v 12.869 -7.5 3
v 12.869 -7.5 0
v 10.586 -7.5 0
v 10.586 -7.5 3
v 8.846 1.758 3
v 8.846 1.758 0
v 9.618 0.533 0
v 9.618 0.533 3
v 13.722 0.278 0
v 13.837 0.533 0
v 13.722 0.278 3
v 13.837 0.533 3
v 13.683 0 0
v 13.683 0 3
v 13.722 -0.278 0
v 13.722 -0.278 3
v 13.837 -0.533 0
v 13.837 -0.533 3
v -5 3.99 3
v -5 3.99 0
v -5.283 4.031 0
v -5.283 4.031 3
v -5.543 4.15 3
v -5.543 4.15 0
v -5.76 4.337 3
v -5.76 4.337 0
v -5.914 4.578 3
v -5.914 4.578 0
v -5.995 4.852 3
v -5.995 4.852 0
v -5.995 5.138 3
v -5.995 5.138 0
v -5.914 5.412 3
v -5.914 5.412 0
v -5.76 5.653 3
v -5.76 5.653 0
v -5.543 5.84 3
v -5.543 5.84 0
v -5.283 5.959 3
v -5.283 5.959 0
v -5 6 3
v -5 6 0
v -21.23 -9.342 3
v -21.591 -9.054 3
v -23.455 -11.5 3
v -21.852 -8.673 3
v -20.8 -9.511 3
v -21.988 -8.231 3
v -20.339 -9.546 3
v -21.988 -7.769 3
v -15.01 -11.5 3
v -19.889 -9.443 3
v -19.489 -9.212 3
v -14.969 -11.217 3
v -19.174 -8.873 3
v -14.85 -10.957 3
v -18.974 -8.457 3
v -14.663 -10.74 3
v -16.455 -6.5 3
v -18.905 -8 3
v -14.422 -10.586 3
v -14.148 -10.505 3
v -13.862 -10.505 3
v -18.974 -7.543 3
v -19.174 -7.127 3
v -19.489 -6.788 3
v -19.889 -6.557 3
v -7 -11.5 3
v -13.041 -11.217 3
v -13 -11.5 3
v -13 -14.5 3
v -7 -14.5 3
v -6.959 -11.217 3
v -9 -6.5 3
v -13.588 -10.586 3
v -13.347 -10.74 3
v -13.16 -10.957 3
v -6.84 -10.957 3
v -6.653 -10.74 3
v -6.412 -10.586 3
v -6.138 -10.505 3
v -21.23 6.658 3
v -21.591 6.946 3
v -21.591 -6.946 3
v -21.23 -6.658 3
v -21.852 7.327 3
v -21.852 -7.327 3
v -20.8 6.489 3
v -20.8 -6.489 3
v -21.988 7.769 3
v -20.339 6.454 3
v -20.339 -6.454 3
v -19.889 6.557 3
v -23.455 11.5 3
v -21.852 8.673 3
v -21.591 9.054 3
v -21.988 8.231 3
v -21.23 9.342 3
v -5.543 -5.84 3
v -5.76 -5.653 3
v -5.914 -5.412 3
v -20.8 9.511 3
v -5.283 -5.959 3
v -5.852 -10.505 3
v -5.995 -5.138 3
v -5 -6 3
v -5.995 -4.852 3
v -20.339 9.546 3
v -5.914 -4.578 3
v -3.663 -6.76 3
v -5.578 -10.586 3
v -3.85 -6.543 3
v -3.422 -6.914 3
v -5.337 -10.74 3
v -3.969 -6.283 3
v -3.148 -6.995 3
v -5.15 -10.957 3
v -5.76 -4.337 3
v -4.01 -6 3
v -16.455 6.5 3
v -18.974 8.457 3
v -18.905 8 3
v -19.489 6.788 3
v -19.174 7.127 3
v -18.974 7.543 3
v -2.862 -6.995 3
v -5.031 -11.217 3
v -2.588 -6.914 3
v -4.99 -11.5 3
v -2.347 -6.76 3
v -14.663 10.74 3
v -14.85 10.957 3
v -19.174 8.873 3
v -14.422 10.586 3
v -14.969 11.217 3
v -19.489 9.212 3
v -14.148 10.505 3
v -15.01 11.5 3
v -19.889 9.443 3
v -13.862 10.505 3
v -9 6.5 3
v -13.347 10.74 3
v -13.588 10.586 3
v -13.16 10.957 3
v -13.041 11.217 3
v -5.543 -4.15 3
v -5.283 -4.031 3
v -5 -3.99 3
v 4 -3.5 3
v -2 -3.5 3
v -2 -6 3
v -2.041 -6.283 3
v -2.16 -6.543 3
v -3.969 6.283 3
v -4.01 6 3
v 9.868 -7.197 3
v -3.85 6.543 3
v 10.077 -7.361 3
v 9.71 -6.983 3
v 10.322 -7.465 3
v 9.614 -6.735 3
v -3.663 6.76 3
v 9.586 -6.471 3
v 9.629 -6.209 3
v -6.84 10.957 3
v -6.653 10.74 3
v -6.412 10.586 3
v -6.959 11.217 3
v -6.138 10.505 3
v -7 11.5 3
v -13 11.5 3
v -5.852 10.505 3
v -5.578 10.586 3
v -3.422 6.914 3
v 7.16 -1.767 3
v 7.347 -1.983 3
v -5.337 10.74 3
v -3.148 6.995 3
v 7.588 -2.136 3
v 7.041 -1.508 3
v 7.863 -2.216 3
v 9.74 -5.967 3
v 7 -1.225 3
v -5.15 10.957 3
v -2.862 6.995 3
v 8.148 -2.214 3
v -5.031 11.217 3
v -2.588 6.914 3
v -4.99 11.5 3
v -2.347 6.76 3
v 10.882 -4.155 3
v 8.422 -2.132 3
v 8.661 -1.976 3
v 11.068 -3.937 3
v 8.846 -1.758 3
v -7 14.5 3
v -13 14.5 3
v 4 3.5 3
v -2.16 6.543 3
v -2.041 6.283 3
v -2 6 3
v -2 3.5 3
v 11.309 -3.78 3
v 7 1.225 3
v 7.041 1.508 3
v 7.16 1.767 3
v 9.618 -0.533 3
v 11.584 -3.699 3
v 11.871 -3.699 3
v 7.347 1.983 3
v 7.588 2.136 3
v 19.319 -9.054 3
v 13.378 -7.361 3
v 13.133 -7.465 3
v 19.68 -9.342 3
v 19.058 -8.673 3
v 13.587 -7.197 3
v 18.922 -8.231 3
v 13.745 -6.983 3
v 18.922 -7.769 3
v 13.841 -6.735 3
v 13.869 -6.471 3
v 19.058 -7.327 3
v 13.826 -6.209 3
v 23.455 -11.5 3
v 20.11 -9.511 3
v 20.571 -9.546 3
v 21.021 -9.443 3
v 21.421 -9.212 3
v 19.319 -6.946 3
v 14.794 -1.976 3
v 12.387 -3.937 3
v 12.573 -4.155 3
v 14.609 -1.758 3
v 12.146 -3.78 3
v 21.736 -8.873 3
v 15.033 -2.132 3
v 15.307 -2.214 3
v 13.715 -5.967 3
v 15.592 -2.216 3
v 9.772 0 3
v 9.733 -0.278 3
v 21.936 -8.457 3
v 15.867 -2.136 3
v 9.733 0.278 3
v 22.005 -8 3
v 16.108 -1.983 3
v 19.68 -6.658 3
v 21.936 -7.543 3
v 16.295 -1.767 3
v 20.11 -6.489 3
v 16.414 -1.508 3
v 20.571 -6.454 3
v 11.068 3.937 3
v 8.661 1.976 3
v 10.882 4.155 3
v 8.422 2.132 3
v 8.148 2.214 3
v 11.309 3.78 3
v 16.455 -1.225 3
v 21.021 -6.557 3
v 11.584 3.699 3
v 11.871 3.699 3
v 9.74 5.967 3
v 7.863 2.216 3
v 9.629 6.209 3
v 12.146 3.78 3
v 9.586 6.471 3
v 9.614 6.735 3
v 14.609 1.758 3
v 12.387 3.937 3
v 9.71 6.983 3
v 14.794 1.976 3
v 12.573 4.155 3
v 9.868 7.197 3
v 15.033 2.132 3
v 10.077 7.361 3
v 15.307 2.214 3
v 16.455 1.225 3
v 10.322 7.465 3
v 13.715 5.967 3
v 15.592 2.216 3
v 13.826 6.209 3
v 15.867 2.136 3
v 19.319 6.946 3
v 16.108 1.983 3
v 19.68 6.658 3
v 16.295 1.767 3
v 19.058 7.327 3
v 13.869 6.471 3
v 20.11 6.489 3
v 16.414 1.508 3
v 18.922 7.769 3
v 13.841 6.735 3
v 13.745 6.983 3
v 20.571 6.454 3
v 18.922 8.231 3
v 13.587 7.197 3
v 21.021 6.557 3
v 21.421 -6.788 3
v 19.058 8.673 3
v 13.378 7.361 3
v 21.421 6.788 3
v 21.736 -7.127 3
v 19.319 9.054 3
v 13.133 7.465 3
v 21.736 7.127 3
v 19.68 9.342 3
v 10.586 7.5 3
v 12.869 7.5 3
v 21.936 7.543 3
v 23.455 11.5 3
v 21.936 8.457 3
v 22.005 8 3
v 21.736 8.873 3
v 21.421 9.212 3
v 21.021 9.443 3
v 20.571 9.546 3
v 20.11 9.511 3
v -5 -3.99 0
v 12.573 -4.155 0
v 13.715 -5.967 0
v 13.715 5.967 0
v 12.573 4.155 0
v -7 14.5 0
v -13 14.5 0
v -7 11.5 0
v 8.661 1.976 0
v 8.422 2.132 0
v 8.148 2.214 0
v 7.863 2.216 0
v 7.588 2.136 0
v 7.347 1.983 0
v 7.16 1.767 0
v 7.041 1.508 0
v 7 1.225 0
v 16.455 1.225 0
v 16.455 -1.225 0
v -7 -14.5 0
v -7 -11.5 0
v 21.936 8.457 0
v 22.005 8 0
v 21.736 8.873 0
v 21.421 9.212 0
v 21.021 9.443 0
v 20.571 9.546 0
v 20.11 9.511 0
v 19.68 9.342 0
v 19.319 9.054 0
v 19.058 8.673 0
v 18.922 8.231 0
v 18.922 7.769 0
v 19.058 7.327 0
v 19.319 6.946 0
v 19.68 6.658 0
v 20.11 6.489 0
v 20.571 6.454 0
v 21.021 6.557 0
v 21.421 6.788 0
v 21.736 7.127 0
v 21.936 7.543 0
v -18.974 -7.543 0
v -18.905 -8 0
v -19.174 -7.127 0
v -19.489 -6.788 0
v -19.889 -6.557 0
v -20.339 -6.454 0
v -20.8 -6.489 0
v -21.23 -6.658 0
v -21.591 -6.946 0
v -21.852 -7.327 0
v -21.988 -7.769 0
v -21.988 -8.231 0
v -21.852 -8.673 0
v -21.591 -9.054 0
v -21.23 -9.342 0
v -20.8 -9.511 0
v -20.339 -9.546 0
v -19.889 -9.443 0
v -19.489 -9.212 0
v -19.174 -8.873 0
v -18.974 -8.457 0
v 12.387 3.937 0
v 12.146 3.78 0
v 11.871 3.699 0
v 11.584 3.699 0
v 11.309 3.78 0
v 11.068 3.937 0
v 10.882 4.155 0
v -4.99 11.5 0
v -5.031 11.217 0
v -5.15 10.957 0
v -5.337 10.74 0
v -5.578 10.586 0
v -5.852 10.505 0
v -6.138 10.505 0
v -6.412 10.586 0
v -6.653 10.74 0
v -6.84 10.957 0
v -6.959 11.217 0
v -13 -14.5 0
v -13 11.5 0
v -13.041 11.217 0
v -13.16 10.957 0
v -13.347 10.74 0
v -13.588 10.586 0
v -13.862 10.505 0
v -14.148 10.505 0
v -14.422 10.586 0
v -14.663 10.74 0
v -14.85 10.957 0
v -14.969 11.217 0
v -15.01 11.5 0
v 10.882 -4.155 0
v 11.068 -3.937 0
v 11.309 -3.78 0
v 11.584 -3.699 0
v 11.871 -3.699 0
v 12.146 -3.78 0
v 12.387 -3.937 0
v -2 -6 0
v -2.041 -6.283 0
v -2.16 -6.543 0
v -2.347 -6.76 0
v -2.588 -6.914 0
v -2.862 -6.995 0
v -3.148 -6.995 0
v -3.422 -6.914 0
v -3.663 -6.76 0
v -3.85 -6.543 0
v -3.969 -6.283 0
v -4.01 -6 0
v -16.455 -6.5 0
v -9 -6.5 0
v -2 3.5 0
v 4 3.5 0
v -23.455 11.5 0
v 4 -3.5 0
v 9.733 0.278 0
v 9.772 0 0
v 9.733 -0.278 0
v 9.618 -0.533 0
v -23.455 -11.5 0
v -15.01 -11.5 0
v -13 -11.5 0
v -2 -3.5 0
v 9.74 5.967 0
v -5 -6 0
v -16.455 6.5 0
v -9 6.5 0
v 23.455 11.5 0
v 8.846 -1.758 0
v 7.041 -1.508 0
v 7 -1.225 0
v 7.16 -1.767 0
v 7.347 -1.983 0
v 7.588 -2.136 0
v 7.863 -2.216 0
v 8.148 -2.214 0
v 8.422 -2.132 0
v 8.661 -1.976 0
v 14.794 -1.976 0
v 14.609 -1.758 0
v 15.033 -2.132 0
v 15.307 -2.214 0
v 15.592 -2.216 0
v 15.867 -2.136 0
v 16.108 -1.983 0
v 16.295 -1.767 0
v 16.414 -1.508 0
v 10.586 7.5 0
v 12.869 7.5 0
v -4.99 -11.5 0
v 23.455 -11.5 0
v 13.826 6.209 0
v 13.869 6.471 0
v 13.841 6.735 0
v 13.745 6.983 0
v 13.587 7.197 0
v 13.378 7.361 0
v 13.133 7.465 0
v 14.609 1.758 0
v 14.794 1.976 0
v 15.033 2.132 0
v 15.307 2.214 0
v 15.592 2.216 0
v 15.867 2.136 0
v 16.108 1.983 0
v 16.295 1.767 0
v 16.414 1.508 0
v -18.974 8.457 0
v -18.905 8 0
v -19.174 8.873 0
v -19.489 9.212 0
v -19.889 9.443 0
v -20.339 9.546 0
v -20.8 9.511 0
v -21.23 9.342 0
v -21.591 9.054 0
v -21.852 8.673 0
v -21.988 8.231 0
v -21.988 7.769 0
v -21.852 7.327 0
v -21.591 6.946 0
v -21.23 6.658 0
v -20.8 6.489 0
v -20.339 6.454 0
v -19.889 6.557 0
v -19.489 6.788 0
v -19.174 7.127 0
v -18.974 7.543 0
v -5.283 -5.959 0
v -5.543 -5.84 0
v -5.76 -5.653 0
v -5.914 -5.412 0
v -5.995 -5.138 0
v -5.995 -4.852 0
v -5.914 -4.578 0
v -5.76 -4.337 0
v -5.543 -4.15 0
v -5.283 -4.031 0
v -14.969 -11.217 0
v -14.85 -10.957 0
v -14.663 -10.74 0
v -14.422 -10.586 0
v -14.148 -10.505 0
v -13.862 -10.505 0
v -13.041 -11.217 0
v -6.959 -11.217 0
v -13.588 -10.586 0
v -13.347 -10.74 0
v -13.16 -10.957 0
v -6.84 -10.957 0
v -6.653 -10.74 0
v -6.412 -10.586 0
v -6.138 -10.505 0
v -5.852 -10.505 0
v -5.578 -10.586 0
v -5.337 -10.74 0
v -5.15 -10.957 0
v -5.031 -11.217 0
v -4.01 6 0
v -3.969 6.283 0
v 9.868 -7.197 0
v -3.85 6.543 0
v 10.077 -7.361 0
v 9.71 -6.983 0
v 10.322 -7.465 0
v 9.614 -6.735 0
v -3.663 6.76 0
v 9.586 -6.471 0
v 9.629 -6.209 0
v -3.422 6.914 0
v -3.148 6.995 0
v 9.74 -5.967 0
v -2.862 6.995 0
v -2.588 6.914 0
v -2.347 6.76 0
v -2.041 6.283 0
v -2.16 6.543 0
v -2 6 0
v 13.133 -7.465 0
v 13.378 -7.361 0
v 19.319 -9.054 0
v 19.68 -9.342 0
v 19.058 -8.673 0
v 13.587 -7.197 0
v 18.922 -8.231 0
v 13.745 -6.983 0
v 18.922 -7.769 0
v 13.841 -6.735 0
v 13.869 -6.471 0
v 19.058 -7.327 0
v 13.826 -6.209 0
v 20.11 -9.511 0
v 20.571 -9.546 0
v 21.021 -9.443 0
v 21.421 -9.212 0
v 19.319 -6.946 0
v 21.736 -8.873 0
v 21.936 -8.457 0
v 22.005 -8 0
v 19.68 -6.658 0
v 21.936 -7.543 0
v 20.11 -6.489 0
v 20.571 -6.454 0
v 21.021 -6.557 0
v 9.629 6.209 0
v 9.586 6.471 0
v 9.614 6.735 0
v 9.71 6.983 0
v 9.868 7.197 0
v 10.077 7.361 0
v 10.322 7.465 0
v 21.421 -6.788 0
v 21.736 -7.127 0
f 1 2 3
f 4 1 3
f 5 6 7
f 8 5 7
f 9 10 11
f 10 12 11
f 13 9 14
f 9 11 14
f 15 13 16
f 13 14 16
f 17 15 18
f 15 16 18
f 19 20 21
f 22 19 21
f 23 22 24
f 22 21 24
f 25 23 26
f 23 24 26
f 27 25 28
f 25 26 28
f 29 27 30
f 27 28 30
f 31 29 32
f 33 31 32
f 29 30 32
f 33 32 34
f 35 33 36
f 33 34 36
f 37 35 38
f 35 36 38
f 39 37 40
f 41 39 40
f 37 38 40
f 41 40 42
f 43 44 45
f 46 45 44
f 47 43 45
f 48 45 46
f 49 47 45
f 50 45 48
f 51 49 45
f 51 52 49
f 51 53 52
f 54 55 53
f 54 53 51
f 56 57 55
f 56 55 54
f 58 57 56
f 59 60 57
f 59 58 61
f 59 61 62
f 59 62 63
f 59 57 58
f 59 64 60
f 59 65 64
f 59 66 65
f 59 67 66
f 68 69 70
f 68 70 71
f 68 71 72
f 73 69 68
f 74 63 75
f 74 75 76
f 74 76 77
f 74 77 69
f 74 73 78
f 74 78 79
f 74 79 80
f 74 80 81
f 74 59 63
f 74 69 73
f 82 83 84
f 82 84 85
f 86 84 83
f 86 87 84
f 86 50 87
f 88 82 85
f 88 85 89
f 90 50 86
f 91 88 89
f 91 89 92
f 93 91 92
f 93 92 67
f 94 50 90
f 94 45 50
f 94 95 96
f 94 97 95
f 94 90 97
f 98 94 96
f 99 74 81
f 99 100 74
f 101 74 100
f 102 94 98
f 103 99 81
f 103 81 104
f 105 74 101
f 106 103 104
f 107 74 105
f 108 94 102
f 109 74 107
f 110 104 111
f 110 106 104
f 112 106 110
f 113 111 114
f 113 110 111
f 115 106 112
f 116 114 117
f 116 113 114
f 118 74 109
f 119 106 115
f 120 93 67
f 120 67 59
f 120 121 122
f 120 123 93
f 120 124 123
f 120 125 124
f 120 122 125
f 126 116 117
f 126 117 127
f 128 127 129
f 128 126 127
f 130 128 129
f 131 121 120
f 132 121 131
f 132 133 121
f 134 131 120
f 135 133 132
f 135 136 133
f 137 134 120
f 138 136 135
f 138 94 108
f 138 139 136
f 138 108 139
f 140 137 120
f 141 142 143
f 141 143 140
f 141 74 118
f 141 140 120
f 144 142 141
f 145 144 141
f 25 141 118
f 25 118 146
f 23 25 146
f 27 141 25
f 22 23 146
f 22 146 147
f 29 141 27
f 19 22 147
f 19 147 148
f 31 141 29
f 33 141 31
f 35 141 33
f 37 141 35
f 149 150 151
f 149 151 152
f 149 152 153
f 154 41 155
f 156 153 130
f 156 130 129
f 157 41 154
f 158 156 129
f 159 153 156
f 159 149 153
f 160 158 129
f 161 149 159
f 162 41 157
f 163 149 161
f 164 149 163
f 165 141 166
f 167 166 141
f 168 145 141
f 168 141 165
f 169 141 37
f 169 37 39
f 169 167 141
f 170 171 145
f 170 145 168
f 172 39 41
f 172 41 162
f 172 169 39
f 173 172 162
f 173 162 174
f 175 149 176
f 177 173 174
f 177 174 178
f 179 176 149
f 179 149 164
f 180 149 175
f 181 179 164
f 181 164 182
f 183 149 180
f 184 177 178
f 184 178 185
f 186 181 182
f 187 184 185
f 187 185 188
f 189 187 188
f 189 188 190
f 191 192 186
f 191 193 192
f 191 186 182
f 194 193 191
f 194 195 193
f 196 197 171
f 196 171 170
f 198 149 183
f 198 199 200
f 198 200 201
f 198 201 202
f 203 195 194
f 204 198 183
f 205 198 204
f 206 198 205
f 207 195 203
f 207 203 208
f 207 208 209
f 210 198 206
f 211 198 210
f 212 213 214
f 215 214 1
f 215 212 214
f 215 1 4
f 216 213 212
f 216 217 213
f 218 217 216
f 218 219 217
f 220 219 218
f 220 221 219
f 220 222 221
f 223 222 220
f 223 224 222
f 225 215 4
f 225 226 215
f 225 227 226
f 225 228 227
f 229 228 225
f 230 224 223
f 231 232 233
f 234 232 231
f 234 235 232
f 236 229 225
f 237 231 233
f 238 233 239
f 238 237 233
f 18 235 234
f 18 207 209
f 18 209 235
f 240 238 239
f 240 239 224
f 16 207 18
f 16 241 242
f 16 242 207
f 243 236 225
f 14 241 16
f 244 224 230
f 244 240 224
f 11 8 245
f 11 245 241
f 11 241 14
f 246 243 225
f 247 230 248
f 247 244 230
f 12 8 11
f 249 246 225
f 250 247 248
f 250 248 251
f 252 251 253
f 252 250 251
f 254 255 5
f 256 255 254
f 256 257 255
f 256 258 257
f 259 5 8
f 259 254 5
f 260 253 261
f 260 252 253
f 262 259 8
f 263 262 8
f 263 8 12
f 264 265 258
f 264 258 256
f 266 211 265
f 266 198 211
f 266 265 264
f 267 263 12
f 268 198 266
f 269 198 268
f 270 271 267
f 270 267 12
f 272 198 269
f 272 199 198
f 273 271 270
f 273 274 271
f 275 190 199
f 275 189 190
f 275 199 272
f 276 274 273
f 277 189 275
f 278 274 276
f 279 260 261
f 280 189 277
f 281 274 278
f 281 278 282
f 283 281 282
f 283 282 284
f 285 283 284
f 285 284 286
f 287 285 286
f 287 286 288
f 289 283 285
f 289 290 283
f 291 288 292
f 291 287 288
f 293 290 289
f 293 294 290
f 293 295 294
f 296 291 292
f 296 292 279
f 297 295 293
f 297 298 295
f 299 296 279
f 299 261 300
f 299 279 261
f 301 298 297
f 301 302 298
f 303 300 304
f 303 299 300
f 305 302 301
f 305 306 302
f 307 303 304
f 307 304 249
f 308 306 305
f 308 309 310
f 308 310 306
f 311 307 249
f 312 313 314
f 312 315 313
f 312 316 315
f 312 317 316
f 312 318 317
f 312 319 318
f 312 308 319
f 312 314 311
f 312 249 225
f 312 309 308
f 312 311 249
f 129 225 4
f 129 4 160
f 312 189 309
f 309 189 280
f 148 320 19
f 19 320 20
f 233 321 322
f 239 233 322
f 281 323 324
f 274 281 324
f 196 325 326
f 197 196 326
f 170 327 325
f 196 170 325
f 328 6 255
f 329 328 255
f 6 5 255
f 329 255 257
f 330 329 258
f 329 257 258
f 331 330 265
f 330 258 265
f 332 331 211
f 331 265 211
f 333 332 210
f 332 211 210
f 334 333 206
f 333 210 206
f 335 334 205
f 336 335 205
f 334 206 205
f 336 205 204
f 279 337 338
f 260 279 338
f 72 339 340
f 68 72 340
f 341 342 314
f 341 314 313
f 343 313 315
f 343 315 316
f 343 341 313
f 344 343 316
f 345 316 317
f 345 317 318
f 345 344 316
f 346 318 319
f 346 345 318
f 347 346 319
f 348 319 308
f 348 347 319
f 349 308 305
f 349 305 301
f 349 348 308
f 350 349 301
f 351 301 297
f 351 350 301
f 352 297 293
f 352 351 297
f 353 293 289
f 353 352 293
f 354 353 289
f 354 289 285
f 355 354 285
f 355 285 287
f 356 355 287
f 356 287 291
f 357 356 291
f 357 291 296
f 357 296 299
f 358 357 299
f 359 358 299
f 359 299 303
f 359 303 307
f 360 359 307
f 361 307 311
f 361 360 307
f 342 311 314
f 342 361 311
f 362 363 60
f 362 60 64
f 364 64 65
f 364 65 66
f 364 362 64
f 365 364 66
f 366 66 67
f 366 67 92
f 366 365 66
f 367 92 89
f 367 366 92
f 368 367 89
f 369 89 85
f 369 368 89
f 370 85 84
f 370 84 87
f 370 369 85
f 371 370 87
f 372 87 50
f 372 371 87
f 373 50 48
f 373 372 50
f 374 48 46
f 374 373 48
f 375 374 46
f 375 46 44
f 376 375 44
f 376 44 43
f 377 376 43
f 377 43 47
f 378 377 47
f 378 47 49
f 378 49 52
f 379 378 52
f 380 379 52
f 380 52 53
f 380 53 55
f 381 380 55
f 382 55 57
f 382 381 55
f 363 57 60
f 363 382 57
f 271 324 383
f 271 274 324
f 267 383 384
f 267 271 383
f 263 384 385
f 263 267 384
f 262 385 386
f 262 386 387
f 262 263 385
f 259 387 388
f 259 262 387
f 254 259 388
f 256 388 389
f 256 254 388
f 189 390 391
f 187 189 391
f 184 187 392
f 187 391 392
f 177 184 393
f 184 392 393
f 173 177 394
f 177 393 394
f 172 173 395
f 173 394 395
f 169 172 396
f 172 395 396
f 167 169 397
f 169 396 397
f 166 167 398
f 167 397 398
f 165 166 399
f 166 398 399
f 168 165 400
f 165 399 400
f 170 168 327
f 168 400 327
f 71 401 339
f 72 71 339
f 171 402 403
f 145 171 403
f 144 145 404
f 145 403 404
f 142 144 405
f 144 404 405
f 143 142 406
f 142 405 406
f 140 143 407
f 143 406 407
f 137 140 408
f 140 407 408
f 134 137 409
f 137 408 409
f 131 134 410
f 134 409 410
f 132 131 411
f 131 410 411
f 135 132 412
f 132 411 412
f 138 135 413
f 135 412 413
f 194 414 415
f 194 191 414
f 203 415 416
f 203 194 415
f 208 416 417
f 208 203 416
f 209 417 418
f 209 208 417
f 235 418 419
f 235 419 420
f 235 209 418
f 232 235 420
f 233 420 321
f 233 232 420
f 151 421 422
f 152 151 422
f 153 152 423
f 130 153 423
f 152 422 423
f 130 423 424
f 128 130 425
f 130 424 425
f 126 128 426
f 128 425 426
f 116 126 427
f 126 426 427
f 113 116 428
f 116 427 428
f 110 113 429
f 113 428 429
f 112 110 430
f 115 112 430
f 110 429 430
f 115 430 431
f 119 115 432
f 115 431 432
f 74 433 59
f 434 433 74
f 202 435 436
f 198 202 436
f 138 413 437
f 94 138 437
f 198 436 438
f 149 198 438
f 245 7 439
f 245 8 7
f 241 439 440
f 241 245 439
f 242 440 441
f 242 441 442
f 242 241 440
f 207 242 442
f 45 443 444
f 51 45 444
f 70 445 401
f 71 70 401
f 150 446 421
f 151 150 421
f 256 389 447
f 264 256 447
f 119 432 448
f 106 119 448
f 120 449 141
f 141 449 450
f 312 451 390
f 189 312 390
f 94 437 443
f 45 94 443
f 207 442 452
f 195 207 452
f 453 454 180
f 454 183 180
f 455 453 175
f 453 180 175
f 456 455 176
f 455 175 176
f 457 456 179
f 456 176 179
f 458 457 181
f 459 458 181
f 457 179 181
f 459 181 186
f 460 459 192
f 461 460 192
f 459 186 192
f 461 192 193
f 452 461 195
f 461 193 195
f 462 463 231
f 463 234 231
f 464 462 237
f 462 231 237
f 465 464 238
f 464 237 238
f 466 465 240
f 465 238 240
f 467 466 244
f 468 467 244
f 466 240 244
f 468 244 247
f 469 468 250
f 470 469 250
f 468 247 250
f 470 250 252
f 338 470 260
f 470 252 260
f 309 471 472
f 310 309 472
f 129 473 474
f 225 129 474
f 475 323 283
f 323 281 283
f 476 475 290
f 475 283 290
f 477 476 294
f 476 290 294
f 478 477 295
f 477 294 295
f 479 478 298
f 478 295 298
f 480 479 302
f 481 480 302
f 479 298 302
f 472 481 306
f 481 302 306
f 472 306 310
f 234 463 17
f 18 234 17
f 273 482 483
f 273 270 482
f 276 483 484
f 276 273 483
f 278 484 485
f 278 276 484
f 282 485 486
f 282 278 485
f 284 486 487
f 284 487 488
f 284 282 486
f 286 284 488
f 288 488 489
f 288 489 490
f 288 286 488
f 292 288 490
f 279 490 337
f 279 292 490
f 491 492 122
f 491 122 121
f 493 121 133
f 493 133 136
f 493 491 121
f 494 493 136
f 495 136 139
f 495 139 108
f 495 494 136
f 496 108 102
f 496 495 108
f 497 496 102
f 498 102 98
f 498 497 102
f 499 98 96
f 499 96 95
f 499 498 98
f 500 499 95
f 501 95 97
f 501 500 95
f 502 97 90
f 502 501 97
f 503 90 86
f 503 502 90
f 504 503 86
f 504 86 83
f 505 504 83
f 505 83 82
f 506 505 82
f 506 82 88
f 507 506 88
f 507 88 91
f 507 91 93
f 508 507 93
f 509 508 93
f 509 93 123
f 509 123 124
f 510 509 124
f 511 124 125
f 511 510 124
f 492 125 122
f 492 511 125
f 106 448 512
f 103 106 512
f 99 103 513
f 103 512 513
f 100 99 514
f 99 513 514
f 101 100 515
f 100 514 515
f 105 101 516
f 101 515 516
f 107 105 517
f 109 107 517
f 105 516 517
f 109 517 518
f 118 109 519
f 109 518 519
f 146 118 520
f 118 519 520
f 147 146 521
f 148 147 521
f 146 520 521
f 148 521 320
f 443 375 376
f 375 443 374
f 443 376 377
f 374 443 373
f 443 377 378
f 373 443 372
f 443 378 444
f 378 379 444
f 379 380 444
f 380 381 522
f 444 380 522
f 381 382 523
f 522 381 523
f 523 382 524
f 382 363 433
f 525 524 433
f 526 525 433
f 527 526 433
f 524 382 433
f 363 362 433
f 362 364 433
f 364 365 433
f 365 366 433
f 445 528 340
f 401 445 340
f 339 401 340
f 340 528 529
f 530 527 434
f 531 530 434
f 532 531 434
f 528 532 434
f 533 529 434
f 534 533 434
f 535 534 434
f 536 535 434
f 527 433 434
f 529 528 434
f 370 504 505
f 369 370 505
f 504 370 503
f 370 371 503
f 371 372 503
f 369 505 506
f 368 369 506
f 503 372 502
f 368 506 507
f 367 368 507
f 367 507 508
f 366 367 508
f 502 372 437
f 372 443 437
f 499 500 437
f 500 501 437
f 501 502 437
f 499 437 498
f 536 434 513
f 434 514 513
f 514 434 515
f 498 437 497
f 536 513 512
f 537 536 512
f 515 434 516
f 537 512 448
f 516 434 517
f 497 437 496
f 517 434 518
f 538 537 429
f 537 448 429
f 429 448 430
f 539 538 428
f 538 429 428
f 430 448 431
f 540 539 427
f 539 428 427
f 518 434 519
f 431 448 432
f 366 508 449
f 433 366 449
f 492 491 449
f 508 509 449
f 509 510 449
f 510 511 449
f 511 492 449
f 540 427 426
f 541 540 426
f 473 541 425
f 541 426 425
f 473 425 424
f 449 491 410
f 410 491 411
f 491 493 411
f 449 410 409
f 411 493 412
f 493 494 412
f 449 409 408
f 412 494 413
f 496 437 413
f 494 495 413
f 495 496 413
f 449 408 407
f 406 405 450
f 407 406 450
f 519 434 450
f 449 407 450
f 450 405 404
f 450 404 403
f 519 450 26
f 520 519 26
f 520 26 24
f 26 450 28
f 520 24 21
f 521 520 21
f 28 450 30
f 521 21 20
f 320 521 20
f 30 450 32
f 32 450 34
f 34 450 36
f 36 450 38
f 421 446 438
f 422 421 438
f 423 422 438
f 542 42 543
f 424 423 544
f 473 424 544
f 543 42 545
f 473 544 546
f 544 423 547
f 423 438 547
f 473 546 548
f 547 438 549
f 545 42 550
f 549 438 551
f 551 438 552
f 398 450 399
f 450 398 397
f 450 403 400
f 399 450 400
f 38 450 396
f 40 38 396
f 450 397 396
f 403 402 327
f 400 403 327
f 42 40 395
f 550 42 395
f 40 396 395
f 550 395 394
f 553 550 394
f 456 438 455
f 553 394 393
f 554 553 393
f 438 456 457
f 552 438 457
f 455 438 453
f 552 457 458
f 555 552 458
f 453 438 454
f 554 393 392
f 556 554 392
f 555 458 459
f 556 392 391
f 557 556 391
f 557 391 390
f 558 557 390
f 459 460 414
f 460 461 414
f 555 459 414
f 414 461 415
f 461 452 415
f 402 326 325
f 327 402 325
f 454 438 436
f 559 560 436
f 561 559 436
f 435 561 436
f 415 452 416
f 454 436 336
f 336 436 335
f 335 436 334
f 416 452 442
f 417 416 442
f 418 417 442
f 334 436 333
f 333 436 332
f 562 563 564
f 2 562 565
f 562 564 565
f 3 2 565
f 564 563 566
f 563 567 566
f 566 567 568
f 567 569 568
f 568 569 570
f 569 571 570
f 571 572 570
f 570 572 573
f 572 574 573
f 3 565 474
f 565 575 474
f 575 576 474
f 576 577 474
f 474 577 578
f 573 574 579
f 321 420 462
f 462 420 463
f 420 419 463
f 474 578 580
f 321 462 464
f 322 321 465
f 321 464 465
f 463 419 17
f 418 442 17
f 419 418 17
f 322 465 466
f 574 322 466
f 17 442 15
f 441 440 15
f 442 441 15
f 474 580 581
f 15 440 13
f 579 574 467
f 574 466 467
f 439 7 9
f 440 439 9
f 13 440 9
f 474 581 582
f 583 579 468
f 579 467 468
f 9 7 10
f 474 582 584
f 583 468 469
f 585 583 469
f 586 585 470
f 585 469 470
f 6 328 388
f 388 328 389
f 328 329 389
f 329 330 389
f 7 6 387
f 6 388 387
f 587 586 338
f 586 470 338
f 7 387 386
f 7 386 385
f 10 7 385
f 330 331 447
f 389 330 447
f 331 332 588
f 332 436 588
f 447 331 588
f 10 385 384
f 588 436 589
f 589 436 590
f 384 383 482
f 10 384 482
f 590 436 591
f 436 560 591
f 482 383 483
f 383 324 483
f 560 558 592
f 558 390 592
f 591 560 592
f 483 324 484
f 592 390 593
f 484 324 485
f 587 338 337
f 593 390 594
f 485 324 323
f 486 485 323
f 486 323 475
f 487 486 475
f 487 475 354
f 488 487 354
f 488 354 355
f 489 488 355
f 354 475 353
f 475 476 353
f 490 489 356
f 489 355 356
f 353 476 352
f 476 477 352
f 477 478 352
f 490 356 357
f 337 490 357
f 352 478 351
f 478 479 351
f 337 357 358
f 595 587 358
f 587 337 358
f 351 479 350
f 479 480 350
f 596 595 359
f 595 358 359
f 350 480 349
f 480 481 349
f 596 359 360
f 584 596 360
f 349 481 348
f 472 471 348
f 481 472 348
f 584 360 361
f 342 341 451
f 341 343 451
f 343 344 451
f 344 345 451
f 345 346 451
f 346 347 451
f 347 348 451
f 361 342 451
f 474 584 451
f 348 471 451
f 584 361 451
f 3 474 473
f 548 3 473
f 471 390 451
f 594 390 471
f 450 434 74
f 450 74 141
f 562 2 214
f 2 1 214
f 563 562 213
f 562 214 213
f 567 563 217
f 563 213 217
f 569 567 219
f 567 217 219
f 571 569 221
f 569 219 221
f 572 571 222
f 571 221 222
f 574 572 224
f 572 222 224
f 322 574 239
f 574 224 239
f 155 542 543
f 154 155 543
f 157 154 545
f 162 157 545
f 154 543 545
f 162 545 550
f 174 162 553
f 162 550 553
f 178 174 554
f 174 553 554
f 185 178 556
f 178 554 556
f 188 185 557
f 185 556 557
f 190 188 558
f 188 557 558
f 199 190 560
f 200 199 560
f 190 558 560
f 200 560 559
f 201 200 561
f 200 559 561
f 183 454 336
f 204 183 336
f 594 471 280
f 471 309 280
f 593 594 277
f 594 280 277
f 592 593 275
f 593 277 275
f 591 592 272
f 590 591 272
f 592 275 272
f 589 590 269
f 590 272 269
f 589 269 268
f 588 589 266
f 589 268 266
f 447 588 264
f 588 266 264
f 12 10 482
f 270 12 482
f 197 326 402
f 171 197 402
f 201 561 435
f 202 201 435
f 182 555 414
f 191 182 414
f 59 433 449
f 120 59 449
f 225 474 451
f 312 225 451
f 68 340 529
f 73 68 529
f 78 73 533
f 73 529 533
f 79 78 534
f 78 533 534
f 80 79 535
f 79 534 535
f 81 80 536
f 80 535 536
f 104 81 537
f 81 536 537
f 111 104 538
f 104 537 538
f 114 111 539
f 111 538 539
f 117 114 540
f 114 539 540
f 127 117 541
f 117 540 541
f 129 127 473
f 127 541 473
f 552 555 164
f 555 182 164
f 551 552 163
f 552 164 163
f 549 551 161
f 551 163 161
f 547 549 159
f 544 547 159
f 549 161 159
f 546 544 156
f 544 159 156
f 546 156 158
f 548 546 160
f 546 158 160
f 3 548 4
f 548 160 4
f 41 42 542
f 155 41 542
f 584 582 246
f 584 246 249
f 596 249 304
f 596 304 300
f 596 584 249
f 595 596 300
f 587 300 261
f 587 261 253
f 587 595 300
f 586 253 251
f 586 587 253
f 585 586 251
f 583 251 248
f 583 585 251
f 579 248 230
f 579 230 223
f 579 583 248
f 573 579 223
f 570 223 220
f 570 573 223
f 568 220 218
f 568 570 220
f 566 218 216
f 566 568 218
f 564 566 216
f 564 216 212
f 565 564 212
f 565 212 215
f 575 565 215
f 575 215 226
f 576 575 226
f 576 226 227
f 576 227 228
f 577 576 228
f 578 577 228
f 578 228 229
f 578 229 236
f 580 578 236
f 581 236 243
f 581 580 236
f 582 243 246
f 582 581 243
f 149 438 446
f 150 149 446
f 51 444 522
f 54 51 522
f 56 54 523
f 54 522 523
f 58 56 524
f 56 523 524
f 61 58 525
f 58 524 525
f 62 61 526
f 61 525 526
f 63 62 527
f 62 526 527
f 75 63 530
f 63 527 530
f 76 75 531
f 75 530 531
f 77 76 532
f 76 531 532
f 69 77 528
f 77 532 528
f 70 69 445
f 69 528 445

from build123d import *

# Parameters (mm, degrees)
SKETCH_1_R      = 1.55
SKETCH_1_W      = 7.455
SKETCH_1_H      = 13
EXTRUDE_1_DEPTH = 3
FILLET_1_R      = 1


with BuildPart() as part:
    # 草图1 → 凸台-拉伸1 (new body)
    with BuildSketch(Plane.XY):
        with BuildLine():
            Line((-13, 14.5), (-13, 11.5))
            ThreePointArc((-13, 11.5), (-14.005, 10.495), (-15.01, 11.5))
            Line((-15.01, 11.5), (-23.455, 11.5))
            Line((-23.455, 11.5), (-23.455, -11.5))
            Line((-23.455, -11.5), (-15.01, -11.5))
            ThreePointArc((-15.01, -11.5), (-14.005, -10.495), (-13, -11.5))
            Line((-13, -11.5), (-13, -14.5))
            Line((-13, -14.5), (-7, -14.5))
            Line((-7, -14.5), (-7, -11.5))
            ThreePointArc((-7, -11.5), (-5.995, -10.495), (-4.99, -11.5))
            Line((-4.99, -11.5), (23.455, -11.5))
            Line((23.455, -11.5), (23.455, 11.5))
            Line((23.455, 11.5), (-4.99, 11.5))
            ThreePointArc((-4.99, 11.5), (-5.995, 10.495), (-7, 11.5))
            Line((-7, 11.5), (-7, 14.5))
            Line((-7, 14.5), (-13, 14.5))
        make_face()
        with Locations((-20.455, -8)):
            Circle(SKETCH_1_R, mode=Mode.SUBTRACT)
        with Locations((20.455, -8)):
            Circle(SKETCH_1_R, mode=Mode.SUBTRACT)
        Polygon((9.954375568, 0), (7, -4.687005132), (7, 4.687005132), align=None, mode=Mode.SUBTRACT)
        Polygon((11.7275, -2.812994868), (14.681875568, -7.5), (8.773124432, -7.5), align=None, mode=Mode.SUBTRACT)
        with Locations((-12.7275, 0)):
            Rectangle(SKETCH_1_W, SKETCH_1_H, mode=Mode.SUBTRACT)
        with BuildLine():
            Line((-2, -3.5), (-2, -6))
            ThreePointArc((-2, -6), (-3.005, -7.005), (-4.01, -6))
            Line((-4.01, -6), (-5, -6))
            ThreePointArc((-5, -6), (-6.005, -4.995), (-5, -3.99))
            Line((-5, -3.99), (-5, 3.99))
            ThreePointArc((-5, 3.99), (-6.005, 4.995), (-5, 6))
            Line((-5, 6), (-4.01, 6))
            ThreePointArc((-4.01, 6), (-3.005, 7.005), (-2, 6))
            Line((-2, 6), (-2, 3.5))
            Line((-2, 3.5), (4, 3.5))
            Line((4, 3.5), (4, -3.5))
            Line((4, -3.5), (-2, -3.5))
        make_face(mode=Mode.SUBTRACT)
        with Locations((-20.455, 8)):
            Circle(SKETCH_1_R, mode=Mode.SUBTRACT)
        Polygon((16.455, 4.687005132), (16.455, -4.687005132), (13.500624432, 0), align=None, mode=Mode.SUBTRACT)
        Polygon((11.7275, 2.812994868), (8.773124432, 7.5), (14.681875568, 7.5), align=None, mode=Mode.SUBTRACT)
        with Locations((20.455, 8)):
            Circle(SKETCH_1_R, mode=Mode.SUBTRACT)
    extrude(amount=EXTRUDE_1_DEPTH)

    # 圆角1
    fillet_1_edges = [part.edges().sort_by_distance(p)[0] for p in [
        (16.455, -4.687005132, 1.5),
        (16.455, 4.687005132, 1.5),
        (13.500624432, 0, 1.5),
        (14.681875568, -7.5, 1.5),
        (11.7275, -2.812994868, 1.5),
        (8.773124432, -7.5, 1.5),
        (7, 4.687005132, 1.5),
        (7, -4.687005132, 1.5),
        (9.954375568, 0, 1.5),
        (14.681875568, 7.5, 1.5),
        (8.773124432, 7.5, 1.5),
        (11.7275, 2.812994868, 1.5),
    ]]
    fillet(fillet_1_edges, radius=FILLET_1_R)


solid = part.part
